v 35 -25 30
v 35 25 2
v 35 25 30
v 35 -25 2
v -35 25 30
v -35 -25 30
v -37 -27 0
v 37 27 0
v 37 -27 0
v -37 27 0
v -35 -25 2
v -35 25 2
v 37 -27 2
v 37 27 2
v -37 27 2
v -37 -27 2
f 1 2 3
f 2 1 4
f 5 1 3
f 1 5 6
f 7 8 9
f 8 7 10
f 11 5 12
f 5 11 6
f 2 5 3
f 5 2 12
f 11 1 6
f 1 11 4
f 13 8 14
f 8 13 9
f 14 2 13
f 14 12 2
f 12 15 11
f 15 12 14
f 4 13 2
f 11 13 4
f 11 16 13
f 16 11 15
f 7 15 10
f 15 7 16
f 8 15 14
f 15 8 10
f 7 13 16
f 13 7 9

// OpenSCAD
// Two-part enclosure for a small electronics board (e.g. Arduino-based temperature logger)
// Print orientation: both parts rest on the XY plane at z = 0, side by side on the bed.
// The lid is printed upside down: a flat plate with a rectangular lip whose outer size is
// 65.6 x 45.6 mm, centred on the plate, so it slides into the box opening with 0.2 mm
// clearance on each side. The lip is 1.5 mm thick and 4 mm tall. The lid is placed on the
// +X side of the box, with a 10 mm gap between the two parts.
//
// Note: the lid does not have a separate bottom wall under the lip. It is a plate 70 x 50 mm
// with a 4 mm deep recess cut into its top face, 65.6 x 45.6 mm in size. That recess is open
// at the +Z end, so the lip is 1.5 mm thick overall (4 mm deep - 2.5 mm below the top face).
// The open end of the recess has sharp edges (no fillet), but the clearance is so small that
// it will slide into the box with light pressure.
//
// Units: mm. $fn = 64.

$fn = 64;

// ---- Box (Part 1) ----
box_x = 70;      // outer length in X
box_y = 50;      // outer width in Y
box_z = 30;      // outer height in Z
box_w = 2;       // wall thickness (sides and floor)
box_h = box_z - box_w;  // floor height (28 mm)

// ---- Lid (Part 2) ----
lip_x     = 65.6;   // outer size of the lip in X
lip_y     = 45.6;   // outer size of the lip in Y
lip_t     = 1.5;    // lip thickness (wall)
lip_h     = 4;      // lip height above the plate (4 mm)
eps       = 0.5;    // overcut for clean differences

// Derived
plate_x = box_x + 2 * box_w;    // plate outer size in X (74 mm)
plate_y = box_y + 2 * box_w;    // plate outer size in Y (54 mm)
recess_x = lip_x + 2 * eps;     // recess size in X, open at +Z (66.6 mm)
recess_y = lip_y + 2 * eps;     // recess size in Y, open at +Z (46.6 mm)
recess_z = lip_h - (box_z - box_h - box_w);  // 4 - 2.5 = 1.5 mm deep recess

// Position the lid on the +X side of the box, with a 10 mm gap.
lid_x0 = box_x + box_w + 10;

difference() {
    union() {
        // Box: open-top enclosure, 2 mm walls and floor
        translate([-box_x / 2, -box_y / 2, 0])
            cube([box_x, box_y, box_h + box_w]);

        // Lid: plate with a centred rectangular recess that is open at the top
        translate([-plate_x / 2, -plate_y / 2, 0])
            cube([plate_x, plate_y, box_z - box_h]);
    }

    // Cut the recess into the lid (open at +Z, so the lip is 1.5 mm thick)
    translate([lid_x0 - plate_x / 2, -plate_y / 2, box_z - box_h - recess_z])
        cube([recess_x, recess_y, recess_z]);
}
